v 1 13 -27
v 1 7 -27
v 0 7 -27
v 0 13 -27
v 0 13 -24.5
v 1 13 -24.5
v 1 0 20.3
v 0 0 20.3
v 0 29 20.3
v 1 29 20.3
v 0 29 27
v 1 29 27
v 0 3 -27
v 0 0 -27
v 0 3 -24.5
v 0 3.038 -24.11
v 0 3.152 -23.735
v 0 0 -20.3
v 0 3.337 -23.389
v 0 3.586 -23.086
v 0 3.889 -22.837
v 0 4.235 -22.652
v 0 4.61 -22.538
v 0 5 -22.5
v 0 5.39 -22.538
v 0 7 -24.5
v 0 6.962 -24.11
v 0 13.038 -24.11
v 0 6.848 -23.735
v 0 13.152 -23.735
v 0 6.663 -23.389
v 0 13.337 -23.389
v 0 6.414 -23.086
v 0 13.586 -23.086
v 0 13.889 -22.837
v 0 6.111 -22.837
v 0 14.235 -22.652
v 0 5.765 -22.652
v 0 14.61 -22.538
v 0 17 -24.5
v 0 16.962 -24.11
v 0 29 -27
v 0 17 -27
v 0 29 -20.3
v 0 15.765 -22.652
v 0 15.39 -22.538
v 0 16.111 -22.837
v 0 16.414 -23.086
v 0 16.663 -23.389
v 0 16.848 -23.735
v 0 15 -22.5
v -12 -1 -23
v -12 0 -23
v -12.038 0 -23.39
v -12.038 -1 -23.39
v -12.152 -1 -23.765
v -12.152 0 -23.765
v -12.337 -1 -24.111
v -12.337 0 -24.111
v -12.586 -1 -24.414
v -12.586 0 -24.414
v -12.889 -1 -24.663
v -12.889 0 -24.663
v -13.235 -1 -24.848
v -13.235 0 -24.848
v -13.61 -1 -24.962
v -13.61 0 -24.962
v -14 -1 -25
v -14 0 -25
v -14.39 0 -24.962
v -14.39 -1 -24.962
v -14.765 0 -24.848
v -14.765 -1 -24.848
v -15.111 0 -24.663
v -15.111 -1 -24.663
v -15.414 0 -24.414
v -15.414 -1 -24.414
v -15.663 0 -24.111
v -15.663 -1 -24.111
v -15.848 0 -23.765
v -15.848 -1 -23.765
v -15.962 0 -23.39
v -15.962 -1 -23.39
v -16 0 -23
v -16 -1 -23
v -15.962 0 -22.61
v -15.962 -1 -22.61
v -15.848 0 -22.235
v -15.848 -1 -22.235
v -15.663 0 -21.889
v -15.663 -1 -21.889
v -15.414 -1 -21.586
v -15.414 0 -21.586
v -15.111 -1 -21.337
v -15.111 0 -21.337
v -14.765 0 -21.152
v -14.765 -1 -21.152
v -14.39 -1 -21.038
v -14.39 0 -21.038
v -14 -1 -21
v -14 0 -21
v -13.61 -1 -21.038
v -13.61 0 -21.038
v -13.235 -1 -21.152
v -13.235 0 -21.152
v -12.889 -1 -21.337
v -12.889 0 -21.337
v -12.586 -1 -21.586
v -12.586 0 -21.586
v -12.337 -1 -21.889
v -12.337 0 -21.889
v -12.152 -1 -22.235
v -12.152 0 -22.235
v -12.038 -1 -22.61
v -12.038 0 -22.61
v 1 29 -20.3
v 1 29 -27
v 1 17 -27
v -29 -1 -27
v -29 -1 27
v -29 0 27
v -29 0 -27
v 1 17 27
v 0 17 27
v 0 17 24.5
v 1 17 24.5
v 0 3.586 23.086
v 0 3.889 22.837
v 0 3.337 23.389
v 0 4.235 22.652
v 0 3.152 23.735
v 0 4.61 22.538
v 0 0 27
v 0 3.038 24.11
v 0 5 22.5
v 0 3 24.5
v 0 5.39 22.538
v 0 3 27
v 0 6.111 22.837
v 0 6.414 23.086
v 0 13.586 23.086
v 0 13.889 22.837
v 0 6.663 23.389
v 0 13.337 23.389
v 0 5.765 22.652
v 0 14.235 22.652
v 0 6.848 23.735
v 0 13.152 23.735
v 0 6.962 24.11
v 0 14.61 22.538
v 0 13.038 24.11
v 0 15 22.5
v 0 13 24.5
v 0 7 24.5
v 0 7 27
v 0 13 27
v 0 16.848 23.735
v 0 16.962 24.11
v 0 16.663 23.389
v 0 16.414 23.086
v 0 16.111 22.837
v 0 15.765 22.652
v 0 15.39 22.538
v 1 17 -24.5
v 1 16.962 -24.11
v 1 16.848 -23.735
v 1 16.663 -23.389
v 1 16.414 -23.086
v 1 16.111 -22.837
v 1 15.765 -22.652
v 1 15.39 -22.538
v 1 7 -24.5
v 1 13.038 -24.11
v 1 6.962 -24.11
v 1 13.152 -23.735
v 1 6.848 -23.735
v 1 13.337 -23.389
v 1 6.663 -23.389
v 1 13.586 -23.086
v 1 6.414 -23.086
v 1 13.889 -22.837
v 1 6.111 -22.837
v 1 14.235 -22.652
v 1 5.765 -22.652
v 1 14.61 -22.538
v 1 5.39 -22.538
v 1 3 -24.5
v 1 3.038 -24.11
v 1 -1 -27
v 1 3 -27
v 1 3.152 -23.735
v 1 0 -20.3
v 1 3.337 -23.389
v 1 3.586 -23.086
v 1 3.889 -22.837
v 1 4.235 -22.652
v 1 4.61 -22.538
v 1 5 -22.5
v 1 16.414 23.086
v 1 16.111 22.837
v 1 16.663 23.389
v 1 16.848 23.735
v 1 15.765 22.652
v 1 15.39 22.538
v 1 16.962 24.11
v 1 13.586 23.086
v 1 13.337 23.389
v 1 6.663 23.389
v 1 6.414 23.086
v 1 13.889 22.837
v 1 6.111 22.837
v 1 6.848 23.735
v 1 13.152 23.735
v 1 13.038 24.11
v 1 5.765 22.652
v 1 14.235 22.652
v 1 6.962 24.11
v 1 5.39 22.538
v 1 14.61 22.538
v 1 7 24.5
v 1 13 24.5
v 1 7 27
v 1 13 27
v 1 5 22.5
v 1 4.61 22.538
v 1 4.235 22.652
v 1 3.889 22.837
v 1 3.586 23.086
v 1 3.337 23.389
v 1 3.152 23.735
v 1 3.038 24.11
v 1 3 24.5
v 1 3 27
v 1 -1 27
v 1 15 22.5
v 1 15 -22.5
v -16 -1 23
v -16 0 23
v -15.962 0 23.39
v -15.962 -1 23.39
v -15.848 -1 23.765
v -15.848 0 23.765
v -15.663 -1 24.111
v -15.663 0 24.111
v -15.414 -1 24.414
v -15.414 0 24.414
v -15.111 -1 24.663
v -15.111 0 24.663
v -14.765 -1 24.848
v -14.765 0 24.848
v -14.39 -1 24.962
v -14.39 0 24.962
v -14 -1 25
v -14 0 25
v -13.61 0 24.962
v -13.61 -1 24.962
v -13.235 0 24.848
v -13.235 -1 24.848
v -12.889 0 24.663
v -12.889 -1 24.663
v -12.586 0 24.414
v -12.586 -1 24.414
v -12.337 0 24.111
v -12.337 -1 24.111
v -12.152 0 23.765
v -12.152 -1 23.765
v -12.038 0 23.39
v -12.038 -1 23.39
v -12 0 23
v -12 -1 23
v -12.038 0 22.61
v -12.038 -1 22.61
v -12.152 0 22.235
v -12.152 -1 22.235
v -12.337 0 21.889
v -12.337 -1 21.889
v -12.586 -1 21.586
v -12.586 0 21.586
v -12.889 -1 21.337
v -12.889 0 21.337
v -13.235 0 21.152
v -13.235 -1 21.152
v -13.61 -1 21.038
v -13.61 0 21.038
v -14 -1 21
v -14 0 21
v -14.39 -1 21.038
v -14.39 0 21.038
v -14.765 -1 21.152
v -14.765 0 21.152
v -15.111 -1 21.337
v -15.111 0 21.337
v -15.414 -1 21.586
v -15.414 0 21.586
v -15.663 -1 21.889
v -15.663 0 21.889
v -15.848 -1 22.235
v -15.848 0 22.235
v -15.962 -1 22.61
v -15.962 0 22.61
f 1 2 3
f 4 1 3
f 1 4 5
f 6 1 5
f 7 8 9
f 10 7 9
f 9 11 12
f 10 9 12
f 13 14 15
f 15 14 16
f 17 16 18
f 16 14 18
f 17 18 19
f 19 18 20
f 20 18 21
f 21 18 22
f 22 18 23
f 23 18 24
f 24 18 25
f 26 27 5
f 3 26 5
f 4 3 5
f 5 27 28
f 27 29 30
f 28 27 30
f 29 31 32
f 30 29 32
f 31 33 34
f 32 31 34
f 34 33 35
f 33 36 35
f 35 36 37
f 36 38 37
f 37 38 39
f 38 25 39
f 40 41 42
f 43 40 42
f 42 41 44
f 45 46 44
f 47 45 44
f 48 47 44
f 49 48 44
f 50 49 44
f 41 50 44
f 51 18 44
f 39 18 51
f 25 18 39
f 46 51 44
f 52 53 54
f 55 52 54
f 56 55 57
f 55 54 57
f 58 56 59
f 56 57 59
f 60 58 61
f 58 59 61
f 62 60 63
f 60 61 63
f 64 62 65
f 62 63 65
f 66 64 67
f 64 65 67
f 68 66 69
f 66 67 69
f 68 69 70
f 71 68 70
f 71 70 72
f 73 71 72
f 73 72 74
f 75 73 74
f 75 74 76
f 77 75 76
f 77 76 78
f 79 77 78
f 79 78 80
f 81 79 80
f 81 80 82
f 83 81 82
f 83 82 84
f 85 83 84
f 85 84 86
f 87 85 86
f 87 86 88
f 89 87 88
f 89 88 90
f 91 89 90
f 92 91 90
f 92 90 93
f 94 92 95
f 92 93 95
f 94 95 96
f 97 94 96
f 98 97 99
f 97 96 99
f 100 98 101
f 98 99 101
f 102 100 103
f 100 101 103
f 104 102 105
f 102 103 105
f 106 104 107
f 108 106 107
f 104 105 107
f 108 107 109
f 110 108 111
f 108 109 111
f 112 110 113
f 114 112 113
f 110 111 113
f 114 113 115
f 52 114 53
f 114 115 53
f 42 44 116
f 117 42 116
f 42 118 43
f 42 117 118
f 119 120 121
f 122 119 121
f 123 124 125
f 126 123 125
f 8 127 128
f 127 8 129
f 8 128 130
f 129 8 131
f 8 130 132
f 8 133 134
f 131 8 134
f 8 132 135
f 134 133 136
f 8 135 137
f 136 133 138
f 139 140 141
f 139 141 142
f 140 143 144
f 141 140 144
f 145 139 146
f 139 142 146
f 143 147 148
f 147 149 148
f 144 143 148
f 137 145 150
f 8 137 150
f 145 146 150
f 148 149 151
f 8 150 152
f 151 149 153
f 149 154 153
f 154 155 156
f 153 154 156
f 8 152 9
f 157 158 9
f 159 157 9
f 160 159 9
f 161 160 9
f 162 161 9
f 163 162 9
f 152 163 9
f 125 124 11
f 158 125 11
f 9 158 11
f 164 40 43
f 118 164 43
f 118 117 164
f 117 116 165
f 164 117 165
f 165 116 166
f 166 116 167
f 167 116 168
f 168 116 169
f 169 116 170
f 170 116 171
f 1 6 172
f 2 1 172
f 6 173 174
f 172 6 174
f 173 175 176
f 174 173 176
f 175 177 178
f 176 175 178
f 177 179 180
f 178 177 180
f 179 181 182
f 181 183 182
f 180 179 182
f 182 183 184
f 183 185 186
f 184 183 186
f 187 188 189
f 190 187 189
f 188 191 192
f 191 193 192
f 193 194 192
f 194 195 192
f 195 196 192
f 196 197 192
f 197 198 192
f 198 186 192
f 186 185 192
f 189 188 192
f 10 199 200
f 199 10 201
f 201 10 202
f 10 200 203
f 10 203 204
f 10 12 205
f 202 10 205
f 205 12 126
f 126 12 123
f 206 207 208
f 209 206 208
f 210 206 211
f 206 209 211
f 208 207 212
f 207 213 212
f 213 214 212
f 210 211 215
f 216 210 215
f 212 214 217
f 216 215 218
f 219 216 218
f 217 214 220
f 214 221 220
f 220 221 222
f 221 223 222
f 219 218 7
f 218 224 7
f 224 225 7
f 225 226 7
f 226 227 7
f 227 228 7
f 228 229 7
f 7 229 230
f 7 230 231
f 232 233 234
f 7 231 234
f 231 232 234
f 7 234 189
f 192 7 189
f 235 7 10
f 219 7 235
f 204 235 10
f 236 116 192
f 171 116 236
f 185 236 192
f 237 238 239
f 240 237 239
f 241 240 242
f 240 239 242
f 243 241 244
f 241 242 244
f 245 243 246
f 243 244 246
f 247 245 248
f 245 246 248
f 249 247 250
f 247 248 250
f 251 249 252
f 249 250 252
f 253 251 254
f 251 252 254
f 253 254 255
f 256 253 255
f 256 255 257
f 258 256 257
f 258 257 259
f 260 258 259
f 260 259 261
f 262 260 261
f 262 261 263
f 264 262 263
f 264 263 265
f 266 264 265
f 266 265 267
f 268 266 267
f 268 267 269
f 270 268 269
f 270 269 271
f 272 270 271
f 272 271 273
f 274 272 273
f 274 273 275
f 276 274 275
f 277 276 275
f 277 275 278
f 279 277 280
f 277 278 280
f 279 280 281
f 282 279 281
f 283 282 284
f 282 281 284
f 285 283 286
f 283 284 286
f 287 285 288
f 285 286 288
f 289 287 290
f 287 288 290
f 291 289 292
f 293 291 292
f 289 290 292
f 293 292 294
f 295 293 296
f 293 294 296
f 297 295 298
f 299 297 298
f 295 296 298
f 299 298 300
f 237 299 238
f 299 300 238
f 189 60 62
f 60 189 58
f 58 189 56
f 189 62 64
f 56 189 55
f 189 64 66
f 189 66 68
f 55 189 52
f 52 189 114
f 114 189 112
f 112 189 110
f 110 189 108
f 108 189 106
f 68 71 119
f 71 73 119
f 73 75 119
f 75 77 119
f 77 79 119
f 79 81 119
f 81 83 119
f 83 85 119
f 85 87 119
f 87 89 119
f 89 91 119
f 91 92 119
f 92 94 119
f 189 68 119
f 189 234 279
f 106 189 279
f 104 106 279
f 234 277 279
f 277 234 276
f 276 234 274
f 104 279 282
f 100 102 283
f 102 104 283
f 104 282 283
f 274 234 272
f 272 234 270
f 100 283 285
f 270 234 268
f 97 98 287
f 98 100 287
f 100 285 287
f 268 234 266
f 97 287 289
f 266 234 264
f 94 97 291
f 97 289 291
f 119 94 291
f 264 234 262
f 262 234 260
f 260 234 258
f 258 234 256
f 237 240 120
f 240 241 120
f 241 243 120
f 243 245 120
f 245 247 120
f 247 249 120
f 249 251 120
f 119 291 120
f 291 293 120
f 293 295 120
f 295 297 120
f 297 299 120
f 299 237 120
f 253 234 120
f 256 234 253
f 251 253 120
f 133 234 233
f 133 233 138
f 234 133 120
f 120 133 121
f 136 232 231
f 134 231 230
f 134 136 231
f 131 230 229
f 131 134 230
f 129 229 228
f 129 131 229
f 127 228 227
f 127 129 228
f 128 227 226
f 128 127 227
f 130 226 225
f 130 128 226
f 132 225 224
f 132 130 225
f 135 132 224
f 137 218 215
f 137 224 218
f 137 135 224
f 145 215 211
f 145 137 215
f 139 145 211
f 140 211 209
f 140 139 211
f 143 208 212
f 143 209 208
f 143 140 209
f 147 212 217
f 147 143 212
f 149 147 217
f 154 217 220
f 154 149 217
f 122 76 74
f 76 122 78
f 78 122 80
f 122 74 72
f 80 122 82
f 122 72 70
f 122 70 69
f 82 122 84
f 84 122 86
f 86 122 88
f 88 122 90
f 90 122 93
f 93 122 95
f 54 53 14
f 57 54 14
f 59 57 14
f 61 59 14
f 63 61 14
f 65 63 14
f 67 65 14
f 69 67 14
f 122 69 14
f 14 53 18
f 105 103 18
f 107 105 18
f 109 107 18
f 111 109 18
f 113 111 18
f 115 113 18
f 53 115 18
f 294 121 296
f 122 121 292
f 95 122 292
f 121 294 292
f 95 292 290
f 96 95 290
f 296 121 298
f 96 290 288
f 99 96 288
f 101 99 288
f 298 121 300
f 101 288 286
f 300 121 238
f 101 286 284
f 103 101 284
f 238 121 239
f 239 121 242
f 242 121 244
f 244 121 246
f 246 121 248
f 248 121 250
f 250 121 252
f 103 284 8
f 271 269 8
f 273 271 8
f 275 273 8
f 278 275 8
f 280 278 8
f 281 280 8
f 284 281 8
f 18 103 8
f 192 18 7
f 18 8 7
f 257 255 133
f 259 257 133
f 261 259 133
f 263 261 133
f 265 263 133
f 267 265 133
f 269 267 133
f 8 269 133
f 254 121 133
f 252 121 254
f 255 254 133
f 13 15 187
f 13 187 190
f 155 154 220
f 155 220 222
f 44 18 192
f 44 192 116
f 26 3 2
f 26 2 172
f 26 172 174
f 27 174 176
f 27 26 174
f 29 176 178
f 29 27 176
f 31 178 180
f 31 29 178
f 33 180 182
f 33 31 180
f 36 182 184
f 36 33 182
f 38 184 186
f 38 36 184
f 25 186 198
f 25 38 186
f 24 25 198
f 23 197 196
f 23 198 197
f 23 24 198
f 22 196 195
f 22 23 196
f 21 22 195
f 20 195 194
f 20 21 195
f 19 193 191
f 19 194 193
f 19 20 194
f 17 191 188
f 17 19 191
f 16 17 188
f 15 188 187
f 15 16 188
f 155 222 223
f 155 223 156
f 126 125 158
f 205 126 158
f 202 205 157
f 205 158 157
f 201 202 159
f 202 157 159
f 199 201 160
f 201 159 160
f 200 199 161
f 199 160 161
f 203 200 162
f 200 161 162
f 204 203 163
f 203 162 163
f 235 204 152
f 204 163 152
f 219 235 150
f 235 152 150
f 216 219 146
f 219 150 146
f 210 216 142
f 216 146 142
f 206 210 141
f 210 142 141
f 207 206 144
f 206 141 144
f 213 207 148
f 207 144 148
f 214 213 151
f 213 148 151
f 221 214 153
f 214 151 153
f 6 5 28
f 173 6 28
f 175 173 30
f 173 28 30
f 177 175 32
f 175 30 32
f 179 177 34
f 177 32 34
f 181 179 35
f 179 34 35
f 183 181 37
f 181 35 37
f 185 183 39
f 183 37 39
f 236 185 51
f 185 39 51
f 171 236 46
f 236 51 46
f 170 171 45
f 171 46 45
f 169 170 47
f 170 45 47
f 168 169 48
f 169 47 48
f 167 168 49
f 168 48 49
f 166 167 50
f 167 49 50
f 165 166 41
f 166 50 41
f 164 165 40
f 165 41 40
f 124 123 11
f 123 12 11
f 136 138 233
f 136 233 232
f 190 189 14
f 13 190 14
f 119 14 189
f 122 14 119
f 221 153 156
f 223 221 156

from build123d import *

# Parameters (mm, degrees)
BOSS_EXTRUDE1_DEPTH = 27
SKETCH2_W           = 40.6
SKETCH2_H           = 30
CUT_EXTRUDE1_DEPTH  = 50.101934789
CUT_EXTRUDE2_DEPTH  = 50.101934789


with BuildPart() as part:
    # Sketch1 → Boss-Extrude1 (new, symmetric)
    with BuildSketch(Plane.XY):
        Polygon((-29, 0), (0, 0), (0, 29), (1, 29), (1, -1), (-29, -1), align=None)
    extrude(amount=BOSS_EXTRUDE1_DEPTH, both=True)

    # Sketch2 → Cut-Extrude1 (cut, through all)
    with BuildSketch(Plane.ZY):
        with BuildLine():
            Line((-24.5, 17), (-27, 17))
            Line((-27, 17), (-27, 13))
            Line((-27, 13), (-24.5, 13))
            ThreePointArc((-24.5, 13), (-22.5, 15), (-24.5, 17))
        make_face()
        with Locations((0, 15)):
            Rectangle(SKETCH2_W, SKETCH2_H)
        with BuildLine():
            Line((-24.5, 3), (-27, 3))
            Line((-27, 3), (-27, 7))
            Line((-27, 7), (-24.5, 7))
            ThreePointArc((-24.5, 7), (-22.5, 5), (-24.5, 3))
        make_face()
        with BuildLine():
            Line((24.5, 7), (27, 7))
            Line((27, 7), (27, 3))
            Line((27, 3), (24.5, 3))
            ThreePointArc((24.5, 3), (22.5, 5), (24.5, 7))
        make_face()
        with BuildLine():
            Line((24.5, 13), (27, 13))
            Line((27, 13), (27, 17))
            Line((27, 17), (24.5, 17))
            ThreePointArc((24.5, 17), (22.5, 15), (24.5, 13))
        make_face()
    extrude(amount=-CUT_EXTRUDE1_DEPTH, mode=Mode.SUBTRACT)

    # Sketch3 → Cut-Extrude2 (cut, through all)
    with BuildSketch(Plane(origin=(0, 0, 0), x_dir=(1, 0, 0), z_dir=(0, 1, 0))):
        with BuildLine():
            ThreePointArc((-16, 23), (-14, 21), (-12, 23))
            ThreePointArc((-12, 23), (-14, 25), (-16, 23))
        make_face()
        with BuildLine():
            ThreePointArc((-12, -23), (-14, -21), (-16, -23))
            ThreePointArc((-16, -23), (-14, -25), (-12, -23))
        make_face()
    extrude(amount=-CUT_EXTRUDE2_DEPTH, mode=Mode.SUBTRACT)


solid = part.part
